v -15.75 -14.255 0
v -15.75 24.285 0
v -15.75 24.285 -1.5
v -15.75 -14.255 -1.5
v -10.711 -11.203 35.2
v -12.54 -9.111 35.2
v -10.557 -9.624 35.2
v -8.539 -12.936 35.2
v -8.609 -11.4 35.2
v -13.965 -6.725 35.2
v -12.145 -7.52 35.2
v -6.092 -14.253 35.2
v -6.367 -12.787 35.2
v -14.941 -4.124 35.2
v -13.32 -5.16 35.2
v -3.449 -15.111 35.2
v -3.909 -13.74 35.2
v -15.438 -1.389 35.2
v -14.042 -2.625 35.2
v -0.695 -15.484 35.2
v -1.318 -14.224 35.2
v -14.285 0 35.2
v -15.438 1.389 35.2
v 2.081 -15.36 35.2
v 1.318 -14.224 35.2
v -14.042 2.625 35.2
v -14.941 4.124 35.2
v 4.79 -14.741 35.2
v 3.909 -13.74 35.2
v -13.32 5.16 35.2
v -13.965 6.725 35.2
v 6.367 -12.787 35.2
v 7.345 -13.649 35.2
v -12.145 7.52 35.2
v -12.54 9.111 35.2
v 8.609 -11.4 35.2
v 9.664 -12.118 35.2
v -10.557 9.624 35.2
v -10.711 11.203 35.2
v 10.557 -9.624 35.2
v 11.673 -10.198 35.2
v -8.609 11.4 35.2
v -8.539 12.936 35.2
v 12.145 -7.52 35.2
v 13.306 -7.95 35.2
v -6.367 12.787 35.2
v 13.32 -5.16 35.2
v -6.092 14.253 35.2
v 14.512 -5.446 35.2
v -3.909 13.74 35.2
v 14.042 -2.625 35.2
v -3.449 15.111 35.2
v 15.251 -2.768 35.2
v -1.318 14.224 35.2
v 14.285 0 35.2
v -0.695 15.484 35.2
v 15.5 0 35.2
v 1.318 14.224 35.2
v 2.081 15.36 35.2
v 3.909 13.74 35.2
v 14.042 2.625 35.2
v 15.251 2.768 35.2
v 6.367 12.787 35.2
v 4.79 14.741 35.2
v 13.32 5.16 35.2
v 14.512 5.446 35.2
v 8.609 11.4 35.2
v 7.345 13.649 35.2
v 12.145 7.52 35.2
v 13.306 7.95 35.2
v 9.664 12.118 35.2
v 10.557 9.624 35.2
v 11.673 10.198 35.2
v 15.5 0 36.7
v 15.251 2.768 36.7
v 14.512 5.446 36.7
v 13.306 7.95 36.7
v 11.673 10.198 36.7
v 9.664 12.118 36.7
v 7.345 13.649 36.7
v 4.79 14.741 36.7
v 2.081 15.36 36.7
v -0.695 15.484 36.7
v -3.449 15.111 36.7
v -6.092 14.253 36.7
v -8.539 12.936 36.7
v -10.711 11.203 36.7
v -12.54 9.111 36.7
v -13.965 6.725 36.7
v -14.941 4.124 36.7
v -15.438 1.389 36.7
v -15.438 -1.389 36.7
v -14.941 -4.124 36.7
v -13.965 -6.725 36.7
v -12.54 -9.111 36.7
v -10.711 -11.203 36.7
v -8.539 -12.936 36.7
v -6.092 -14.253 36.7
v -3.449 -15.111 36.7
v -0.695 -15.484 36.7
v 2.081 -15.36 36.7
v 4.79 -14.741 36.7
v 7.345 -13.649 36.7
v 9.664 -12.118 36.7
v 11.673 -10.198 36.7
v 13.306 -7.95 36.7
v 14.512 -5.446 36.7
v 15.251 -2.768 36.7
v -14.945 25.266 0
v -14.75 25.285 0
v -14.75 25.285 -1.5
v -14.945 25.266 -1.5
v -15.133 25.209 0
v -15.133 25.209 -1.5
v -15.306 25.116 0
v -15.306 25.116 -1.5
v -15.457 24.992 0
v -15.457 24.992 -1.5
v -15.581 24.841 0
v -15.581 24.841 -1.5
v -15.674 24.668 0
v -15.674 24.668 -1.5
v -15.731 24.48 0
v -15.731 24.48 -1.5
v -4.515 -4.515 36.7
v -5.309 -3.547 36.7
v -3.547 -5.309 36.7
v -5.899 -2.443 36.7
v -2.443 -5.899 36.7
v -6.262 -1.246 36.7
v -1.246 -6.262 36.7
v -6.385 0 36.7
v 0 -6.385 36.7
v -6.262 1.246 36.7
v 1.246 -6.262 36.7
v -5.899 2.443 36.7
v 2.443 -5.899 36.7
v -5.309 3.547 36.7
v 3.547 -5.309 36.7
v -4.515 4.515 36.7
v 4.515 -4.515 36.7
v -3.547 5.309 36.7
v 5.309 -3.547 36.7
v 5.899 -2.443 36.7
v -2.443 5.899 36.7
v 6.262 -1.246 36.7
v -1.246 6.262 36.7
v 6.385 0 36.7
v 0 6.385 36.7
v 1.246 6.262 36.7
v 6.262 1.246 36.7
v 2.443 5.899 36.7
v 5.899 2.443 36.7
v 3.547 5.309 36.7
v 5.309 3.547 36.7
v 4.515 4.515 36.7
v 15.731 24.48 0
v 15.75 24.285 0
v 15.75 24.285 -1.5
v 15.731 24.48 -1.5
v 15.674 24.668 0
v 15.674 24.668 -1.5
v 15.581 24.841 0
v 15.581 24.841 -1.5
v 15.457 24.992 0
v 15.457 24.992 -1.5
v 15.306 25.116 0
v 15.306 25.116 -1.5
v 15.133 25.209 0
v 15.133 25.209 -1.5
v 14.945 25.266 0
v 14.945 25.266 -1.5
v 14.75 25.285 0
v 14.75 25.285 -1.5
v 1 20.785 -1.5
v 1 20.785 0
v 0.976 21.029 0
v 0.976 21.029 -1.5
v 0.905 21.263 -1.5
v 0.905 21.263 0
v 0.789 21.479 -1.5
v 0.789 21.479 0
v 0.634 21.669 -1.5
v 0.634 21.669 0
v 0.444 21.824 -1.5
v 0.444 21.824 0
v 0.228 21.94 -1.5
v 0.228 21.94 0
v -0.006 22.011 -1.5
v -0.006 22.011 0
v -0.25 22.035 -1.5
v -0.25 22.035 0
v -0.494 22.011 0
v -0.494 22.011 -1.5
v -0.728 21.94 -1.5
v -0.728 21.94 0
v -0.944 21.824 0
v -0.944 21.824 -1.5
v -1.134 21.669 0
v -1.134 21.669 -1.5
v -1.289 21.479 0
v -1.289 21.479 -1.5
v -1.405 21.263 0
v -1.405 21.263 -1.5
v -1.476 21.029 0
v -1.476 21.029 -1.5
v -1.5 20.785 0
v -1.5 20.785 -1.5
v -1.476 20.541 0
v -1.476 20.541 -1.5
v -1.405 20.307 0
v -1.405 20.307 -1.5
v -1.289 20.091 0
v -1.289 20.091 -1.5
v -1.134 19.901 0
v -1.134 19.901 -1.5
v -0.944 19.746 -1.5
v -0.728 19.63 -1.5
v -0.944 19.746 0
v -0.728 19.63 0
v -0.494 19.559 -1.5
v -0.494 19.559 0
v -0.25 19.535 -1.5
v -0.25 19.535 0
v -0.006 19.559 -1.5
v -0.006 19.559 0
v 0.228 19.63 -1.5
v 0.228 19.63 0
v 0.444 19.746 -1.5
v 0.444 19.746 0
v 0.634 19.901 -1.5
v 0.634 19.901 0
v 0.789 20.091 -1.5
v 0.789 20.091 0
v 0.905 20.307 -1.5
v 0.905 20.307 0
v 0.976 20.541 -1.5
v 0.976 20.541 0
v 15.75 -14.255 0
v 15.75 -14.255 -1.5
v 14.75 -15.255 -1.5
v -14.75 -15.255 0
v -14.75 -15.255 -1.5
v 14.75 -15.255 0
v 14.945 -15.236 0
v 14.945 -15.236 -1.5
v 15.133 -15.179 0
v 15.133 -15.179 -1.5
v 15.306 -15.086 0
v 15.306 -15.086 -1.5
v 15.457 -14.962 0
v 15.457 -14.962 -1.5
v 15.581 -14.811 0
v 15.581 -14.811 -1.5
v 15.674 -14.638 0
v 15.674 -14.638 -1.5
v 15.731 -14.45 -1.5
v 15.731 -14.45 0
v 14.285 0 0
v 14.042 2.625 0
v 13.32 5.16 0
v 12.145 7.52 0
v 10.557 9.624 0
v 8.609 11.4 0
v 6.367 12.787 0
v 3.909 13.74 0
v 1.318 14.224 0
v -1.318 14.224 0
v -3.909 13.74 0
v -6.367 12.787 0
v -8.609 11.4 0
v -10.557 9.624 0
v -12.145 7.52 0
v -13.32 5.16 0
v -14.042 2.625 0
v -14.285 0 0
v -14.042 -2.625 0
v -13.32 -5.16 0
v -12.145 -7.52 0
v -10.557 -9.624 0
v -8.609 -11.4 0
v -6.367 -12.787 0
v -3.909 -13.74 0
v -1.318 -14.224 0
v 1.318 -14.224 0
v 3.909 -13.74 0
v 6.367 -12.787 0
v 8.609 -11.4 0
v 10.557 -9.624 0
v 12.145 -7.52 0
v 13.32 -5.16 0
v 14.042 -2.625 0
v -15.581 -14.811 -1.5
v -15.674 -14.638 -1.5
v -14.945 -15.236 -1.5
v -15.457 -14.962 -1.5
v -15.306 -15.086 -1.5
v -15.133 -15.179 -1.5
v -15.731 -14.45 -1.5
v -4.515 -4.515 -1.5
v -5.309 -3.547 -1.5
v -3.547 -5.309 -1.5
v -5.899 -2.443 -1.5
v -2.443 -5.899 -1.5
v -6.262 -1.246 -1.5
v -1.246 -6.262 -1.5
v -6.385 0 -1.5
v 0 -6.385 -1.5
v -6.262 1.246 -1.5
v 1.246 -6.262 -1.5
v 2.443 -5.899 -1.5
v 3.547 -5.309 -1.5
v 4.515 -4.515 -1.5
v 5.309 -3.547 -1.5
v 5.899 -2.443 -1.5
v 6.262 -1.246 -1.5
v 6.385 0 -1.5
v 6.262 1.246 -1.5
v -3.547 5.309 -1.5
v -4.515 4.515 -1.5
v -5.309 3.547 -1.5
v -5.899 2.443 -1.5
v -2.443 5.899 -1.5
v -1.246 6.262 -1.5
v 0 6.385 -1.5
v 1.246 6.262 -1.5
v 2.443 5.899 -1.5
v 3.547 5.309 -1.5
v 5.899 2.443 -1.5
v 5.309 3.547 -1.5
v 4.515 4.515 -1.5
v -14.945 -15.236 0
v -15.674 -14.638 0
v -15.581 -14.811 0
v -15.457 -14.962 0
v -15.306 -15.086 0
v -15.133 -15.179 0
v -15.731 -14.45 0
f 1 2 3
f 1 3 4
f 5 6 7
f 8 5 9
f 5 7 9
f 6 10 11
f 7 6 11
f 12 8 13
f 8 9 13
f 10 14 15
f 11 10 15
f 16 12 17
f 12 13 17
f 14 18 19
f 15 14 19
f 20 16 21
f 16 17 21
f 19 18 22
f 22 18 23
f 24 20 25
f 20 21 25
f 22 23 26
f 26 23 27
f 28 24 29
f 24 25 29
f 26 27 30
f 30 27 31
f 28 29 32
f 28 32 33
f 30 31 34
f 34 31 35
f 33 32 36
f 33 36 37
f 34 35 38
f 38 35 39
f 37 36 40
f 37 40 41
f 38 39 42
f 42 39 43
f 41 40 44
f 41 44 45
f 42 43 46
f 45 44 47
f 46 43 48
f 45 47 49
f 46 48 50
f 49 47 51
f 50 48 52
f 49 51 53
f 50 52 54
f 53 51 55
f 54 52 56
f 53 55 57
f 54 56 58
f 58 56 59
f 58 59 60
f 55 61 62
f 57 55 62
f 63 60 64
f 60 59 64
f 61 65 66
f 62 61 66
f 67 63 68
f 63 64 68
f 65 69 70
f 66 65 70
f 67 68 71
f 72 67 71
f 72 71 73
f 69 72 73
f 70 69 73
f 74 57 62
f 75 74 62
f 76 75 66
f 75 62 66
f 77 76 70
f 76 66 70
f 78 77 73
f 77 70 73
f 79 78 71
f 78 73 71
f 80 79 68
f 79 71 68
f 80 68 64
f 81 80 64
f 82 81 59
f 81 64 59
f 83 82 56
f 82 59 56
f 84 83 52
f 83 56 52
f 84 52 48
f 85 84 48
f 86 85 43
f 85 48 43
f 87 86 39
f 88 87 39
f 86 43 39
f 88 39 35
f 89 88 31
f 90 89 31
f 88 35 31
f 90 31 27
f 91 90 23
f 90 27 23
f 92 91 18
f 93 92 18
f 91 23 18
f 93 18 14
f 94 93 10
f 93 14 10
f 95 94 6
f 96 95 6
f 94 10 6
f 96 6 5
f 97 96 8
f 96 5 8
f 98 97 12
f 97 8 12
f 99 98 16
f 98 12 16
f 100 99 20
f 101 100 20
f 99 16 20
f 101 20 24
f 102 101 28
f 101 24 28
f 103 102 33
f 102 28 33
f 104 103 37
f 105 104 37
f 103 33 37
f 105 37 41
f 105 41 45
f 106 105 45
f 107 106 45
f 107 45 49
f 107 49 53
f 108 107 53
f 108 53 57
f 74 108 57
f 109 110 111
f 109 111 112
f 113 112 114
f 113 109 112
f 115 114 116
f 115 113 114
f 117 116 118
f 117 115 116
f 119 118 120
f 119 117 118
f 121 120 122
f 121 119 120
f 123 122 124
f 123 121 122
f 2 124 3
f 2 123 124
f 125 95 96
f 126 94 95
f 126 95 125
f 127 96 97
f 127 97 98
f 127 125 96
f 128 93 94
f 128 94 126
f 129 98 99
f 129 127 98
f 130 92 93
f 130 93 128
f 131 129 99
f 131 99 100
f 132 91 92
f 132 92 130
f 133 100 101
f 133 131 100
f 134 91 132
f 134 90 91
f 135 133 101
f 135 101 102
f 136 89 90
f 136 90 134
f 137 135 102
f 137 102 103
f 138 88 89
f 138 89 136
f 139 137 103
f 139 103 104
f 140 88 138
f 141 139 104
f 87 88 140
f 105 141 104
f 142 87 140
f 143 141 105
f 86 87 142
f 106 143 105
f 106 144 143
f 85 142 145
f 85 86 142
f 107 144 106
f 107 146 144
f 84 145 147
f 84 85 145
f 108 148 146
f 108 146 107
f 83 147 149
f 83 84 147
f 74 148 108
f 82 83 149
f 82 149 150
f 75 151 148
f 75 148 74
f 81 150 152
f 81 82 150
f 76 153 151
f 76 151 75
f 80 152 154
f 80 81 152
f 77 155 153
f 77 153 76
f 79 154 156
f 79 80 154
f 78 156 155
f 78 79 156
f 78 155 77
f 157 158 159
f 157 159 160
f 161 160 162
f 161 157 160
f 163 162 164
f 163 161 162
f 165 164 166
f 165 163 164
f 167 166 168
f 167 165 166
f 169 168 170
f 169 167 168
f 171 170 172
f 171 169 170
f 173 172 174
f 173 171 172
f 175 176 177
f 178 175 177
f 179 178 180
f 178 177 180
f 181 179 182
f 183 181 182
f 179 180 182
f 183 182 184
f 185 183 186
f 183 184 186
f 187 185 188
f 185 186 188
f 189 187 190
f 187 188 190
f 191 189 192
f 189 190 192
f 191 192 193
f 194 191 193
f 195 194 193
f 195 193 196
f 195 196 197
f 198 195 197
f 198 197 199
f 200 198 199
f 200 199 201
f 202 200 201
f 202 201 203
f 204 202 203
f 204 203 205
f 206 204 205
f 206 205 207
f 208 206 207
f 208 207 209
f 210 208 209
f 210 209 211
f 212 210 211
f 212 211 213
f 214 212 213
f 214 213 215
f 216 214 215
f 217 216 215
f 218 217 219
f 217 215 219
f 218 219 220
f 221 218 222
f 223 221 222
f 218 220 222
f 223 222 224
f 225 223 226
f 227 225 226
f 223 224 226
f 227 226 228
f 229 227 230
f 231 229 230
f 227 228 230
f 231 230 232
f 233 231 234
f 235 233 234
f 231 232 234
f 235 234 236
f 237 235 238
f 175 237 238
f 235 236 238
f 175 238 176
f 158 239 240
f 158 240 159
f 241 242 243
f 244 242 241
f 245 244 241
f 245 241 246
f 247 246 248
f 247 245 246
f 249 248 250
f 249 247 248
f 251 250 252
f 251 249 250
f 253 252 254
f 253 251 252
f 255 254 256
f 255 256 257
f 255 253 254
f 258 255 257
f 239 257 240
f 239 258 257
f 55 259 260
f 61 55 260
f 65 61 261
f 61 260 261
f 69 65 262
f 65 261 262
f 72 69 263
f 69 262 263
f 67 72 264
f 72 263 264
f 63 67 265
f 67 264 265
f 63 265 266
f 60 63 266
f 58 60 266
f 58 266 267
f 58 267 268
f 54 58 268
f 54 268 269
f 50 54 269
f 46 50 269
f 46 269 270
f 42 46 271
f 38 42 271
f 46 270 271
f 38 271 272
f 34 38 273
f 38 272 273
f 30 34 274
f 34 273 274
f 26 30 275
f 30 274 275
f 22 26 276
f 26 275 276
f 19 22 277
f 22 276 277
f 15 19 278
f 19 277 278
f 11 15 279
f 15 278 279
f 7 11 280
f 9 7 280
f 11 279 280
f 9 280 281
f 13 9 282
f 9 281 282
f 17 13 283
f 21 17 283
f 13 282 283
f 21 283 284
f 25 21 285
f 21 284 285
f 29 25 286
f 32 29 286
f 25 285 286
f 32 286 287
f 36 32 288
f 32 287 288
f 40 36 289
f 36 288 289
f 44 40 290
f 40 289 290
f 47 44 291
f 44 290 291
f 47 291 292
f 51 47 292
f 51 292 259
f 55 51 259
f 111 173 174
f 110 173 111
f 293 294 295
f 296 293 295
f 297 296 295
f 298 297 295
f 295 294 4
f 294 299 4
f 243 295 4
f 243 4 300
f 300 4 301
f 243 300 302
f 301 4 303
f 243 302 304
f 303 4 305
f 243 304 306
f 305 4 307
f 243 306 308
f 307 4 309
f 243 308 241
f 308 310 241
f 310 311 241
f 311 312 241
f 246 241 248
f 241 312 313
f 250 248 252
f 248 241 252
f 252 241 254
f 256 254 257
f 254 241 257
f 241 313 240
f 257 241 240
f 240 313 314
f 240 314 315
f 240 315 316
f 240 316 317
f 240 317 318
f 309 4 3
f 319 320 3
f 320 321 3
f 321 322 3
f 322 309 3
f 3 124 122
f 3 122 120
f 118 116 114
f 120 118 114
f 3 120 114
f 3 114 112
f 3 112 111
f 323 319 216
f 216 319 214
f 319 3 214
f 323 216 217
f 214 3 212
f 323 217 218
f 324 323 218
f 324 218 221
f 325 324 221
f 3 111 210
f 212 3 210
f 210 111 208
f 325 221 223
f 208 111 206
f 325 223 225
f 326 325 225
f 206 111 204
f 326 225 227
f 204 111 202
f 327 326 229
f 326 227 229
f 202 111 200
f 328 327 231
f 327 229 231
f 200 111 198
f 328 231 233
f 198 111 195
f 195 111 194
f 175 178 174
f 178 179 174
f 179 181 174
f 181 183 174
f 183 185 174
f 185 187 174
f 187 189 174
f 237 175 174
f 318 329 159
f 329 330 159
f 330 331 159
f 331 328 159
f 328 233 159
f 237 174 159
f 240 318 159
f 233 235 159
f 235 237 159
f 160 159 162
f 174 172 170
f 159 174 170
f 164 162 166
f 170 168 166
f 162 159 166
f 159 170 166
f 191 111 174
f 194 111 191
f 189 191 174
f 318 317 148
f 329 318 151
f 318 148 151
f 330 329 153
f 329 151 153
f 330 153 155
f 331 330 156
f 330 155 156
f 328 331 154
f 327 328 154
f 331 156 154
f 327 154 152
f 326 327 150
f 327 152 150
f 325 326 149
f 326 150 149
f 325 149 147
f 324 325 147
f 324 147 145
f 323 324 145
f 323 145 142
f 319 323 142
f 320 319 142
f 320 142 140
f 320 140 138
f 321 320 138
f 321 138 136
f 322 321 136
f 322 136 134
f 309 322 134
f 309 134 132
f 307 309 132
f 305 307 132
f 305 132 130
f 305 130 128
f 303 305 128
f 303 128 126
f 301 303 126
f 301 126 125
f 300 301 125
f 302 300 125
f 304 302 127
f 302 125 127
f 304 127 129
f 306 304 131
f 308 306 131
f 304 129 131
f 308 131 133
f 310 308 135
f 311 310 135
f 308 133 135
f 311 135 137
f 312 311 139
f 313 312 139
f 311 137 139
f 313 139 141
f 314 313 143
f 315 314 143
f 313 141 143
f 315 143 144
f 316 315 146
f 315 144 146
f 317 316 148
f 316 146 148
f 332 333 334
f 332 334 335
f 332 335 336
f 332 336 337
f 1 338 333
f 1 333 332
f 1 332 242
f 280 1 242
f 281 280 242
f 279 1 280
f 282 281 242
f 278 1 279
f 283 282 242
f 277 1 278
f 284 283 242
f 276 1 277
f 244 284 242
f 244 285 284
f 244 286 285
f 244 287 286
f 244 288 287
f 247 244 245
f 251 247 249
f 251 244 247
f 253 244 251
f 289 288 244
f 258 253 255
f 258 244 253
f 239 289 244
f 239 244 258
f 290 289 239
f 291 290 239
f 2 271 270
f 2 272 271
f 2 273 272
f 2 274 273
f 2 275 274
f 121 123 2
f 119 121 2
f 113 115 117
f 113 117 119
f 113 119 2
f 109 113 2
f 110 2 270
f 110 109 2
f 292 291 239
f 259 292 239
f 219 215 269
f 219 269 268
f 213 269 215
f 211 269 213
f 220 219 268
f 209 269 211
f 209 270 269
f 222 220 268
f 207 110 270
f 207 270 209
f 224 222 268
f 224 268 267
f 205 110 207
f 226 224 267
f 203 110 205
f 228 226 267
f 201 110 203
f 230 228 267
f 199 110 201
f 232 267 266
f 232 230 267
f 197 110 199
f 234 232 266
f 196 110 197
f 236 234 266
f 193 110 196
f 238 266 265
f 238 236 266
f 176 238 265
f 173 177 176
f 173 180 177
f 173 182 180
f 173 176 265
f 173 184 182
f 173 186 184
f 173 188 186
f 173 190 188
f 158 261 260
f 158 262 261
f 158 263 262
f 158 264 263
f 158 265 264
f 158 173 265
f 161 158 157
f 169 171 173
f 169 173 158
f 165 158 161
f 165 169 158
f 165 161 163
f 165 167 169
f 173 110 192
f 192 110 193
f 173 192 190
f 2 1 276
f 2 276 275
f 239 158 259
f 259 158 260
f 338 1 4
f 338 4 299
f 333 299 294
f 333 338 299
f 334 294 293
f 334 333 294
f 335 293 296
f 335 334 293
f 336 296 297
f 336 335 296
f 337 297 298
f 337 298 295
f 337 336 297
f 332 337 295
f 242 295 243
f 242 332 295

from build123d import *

# Parameters (mm, degrees)
ESQUISSE1_R             = 14.285
BOSS_EXTRU_1_DEPTH      = 35.2
ESQUISSE2_R             = 15.5
BOSS_EXTRU_2_DEPTH      = 1.5
BOSS_EXTRU_3_DEPTH      = 1.5
ESQUISSE3_R             = 6.385
ESQUISSE3_R_2           = 1.25
ENL_V_MAT_EXTRU_1_DEPTH = 39.2


with BuildPart() as part:
    # Esquisse1 → Boss.-Extru.1 (new body)
    with BuildSketch(Plane.XY):
        Circle(ESQUISSE1_R)
    extrude(amount=BOSS_EXTRU_1_DEPTH)

    # Esquisse2 → Boss.-Extru.2 (add)
    with BuildSketch(Plane.XY.offset(35.2)):
        Circle(ESQUISSE2_R)
    extrude(amount=BOSS_EXTRU_2_DEPTH)

    # Esquisse4 → Boss.-Extru.3 (add)
    with BuildSketch(Plane(origin=(0, 0, 0), x_dir=(-1, 0, 0), z_dir=(0, 0, -1))):
        with BuildLine():
            Line((-14.75, 25.285), (14.75, 25.285))
            ThreePointArc((14.75, 25.285), (15.457106781, 24.992106781), (15.75, 24.285))
            Line((15.75, 24.285), (15.75, -14.255))
            ThreePointArc((15.75, -14.255), (15.457106781, -14.962106781), (14.75, -15.255))
            Line((14.75, -15.255), (-14.75, -15.255))
            ThreePointArc((-14.75, -15.255), (-15.457106781, -14.962106781), (-15.75, -14.255))
            Line((-15.75, -14.255), (-15.75, 24.285))
            ThreePointArc((-15.75, 24.285), (-15.457106781, 24.992106781), (-14.75, 25.285))
        make_face()
    extrude(amount=BOSS_EXTRU_3_DEPTH)

    # Esquisse3 → Enlèv. mat.-Extru.1 (cut, through all)
    with BuildSketch(Plane.XY.offset(36.7)):
        Circle(ESQUISSE3_R)
        with Locations((-0.25, 20.785)):
            Circle(ESQUISSE3_R_2)
    extrude(amount=-ENL_V_MAT_EXTRU_1_DEPTH, mode=Mode.SUBTRACT)


solid = part.part
